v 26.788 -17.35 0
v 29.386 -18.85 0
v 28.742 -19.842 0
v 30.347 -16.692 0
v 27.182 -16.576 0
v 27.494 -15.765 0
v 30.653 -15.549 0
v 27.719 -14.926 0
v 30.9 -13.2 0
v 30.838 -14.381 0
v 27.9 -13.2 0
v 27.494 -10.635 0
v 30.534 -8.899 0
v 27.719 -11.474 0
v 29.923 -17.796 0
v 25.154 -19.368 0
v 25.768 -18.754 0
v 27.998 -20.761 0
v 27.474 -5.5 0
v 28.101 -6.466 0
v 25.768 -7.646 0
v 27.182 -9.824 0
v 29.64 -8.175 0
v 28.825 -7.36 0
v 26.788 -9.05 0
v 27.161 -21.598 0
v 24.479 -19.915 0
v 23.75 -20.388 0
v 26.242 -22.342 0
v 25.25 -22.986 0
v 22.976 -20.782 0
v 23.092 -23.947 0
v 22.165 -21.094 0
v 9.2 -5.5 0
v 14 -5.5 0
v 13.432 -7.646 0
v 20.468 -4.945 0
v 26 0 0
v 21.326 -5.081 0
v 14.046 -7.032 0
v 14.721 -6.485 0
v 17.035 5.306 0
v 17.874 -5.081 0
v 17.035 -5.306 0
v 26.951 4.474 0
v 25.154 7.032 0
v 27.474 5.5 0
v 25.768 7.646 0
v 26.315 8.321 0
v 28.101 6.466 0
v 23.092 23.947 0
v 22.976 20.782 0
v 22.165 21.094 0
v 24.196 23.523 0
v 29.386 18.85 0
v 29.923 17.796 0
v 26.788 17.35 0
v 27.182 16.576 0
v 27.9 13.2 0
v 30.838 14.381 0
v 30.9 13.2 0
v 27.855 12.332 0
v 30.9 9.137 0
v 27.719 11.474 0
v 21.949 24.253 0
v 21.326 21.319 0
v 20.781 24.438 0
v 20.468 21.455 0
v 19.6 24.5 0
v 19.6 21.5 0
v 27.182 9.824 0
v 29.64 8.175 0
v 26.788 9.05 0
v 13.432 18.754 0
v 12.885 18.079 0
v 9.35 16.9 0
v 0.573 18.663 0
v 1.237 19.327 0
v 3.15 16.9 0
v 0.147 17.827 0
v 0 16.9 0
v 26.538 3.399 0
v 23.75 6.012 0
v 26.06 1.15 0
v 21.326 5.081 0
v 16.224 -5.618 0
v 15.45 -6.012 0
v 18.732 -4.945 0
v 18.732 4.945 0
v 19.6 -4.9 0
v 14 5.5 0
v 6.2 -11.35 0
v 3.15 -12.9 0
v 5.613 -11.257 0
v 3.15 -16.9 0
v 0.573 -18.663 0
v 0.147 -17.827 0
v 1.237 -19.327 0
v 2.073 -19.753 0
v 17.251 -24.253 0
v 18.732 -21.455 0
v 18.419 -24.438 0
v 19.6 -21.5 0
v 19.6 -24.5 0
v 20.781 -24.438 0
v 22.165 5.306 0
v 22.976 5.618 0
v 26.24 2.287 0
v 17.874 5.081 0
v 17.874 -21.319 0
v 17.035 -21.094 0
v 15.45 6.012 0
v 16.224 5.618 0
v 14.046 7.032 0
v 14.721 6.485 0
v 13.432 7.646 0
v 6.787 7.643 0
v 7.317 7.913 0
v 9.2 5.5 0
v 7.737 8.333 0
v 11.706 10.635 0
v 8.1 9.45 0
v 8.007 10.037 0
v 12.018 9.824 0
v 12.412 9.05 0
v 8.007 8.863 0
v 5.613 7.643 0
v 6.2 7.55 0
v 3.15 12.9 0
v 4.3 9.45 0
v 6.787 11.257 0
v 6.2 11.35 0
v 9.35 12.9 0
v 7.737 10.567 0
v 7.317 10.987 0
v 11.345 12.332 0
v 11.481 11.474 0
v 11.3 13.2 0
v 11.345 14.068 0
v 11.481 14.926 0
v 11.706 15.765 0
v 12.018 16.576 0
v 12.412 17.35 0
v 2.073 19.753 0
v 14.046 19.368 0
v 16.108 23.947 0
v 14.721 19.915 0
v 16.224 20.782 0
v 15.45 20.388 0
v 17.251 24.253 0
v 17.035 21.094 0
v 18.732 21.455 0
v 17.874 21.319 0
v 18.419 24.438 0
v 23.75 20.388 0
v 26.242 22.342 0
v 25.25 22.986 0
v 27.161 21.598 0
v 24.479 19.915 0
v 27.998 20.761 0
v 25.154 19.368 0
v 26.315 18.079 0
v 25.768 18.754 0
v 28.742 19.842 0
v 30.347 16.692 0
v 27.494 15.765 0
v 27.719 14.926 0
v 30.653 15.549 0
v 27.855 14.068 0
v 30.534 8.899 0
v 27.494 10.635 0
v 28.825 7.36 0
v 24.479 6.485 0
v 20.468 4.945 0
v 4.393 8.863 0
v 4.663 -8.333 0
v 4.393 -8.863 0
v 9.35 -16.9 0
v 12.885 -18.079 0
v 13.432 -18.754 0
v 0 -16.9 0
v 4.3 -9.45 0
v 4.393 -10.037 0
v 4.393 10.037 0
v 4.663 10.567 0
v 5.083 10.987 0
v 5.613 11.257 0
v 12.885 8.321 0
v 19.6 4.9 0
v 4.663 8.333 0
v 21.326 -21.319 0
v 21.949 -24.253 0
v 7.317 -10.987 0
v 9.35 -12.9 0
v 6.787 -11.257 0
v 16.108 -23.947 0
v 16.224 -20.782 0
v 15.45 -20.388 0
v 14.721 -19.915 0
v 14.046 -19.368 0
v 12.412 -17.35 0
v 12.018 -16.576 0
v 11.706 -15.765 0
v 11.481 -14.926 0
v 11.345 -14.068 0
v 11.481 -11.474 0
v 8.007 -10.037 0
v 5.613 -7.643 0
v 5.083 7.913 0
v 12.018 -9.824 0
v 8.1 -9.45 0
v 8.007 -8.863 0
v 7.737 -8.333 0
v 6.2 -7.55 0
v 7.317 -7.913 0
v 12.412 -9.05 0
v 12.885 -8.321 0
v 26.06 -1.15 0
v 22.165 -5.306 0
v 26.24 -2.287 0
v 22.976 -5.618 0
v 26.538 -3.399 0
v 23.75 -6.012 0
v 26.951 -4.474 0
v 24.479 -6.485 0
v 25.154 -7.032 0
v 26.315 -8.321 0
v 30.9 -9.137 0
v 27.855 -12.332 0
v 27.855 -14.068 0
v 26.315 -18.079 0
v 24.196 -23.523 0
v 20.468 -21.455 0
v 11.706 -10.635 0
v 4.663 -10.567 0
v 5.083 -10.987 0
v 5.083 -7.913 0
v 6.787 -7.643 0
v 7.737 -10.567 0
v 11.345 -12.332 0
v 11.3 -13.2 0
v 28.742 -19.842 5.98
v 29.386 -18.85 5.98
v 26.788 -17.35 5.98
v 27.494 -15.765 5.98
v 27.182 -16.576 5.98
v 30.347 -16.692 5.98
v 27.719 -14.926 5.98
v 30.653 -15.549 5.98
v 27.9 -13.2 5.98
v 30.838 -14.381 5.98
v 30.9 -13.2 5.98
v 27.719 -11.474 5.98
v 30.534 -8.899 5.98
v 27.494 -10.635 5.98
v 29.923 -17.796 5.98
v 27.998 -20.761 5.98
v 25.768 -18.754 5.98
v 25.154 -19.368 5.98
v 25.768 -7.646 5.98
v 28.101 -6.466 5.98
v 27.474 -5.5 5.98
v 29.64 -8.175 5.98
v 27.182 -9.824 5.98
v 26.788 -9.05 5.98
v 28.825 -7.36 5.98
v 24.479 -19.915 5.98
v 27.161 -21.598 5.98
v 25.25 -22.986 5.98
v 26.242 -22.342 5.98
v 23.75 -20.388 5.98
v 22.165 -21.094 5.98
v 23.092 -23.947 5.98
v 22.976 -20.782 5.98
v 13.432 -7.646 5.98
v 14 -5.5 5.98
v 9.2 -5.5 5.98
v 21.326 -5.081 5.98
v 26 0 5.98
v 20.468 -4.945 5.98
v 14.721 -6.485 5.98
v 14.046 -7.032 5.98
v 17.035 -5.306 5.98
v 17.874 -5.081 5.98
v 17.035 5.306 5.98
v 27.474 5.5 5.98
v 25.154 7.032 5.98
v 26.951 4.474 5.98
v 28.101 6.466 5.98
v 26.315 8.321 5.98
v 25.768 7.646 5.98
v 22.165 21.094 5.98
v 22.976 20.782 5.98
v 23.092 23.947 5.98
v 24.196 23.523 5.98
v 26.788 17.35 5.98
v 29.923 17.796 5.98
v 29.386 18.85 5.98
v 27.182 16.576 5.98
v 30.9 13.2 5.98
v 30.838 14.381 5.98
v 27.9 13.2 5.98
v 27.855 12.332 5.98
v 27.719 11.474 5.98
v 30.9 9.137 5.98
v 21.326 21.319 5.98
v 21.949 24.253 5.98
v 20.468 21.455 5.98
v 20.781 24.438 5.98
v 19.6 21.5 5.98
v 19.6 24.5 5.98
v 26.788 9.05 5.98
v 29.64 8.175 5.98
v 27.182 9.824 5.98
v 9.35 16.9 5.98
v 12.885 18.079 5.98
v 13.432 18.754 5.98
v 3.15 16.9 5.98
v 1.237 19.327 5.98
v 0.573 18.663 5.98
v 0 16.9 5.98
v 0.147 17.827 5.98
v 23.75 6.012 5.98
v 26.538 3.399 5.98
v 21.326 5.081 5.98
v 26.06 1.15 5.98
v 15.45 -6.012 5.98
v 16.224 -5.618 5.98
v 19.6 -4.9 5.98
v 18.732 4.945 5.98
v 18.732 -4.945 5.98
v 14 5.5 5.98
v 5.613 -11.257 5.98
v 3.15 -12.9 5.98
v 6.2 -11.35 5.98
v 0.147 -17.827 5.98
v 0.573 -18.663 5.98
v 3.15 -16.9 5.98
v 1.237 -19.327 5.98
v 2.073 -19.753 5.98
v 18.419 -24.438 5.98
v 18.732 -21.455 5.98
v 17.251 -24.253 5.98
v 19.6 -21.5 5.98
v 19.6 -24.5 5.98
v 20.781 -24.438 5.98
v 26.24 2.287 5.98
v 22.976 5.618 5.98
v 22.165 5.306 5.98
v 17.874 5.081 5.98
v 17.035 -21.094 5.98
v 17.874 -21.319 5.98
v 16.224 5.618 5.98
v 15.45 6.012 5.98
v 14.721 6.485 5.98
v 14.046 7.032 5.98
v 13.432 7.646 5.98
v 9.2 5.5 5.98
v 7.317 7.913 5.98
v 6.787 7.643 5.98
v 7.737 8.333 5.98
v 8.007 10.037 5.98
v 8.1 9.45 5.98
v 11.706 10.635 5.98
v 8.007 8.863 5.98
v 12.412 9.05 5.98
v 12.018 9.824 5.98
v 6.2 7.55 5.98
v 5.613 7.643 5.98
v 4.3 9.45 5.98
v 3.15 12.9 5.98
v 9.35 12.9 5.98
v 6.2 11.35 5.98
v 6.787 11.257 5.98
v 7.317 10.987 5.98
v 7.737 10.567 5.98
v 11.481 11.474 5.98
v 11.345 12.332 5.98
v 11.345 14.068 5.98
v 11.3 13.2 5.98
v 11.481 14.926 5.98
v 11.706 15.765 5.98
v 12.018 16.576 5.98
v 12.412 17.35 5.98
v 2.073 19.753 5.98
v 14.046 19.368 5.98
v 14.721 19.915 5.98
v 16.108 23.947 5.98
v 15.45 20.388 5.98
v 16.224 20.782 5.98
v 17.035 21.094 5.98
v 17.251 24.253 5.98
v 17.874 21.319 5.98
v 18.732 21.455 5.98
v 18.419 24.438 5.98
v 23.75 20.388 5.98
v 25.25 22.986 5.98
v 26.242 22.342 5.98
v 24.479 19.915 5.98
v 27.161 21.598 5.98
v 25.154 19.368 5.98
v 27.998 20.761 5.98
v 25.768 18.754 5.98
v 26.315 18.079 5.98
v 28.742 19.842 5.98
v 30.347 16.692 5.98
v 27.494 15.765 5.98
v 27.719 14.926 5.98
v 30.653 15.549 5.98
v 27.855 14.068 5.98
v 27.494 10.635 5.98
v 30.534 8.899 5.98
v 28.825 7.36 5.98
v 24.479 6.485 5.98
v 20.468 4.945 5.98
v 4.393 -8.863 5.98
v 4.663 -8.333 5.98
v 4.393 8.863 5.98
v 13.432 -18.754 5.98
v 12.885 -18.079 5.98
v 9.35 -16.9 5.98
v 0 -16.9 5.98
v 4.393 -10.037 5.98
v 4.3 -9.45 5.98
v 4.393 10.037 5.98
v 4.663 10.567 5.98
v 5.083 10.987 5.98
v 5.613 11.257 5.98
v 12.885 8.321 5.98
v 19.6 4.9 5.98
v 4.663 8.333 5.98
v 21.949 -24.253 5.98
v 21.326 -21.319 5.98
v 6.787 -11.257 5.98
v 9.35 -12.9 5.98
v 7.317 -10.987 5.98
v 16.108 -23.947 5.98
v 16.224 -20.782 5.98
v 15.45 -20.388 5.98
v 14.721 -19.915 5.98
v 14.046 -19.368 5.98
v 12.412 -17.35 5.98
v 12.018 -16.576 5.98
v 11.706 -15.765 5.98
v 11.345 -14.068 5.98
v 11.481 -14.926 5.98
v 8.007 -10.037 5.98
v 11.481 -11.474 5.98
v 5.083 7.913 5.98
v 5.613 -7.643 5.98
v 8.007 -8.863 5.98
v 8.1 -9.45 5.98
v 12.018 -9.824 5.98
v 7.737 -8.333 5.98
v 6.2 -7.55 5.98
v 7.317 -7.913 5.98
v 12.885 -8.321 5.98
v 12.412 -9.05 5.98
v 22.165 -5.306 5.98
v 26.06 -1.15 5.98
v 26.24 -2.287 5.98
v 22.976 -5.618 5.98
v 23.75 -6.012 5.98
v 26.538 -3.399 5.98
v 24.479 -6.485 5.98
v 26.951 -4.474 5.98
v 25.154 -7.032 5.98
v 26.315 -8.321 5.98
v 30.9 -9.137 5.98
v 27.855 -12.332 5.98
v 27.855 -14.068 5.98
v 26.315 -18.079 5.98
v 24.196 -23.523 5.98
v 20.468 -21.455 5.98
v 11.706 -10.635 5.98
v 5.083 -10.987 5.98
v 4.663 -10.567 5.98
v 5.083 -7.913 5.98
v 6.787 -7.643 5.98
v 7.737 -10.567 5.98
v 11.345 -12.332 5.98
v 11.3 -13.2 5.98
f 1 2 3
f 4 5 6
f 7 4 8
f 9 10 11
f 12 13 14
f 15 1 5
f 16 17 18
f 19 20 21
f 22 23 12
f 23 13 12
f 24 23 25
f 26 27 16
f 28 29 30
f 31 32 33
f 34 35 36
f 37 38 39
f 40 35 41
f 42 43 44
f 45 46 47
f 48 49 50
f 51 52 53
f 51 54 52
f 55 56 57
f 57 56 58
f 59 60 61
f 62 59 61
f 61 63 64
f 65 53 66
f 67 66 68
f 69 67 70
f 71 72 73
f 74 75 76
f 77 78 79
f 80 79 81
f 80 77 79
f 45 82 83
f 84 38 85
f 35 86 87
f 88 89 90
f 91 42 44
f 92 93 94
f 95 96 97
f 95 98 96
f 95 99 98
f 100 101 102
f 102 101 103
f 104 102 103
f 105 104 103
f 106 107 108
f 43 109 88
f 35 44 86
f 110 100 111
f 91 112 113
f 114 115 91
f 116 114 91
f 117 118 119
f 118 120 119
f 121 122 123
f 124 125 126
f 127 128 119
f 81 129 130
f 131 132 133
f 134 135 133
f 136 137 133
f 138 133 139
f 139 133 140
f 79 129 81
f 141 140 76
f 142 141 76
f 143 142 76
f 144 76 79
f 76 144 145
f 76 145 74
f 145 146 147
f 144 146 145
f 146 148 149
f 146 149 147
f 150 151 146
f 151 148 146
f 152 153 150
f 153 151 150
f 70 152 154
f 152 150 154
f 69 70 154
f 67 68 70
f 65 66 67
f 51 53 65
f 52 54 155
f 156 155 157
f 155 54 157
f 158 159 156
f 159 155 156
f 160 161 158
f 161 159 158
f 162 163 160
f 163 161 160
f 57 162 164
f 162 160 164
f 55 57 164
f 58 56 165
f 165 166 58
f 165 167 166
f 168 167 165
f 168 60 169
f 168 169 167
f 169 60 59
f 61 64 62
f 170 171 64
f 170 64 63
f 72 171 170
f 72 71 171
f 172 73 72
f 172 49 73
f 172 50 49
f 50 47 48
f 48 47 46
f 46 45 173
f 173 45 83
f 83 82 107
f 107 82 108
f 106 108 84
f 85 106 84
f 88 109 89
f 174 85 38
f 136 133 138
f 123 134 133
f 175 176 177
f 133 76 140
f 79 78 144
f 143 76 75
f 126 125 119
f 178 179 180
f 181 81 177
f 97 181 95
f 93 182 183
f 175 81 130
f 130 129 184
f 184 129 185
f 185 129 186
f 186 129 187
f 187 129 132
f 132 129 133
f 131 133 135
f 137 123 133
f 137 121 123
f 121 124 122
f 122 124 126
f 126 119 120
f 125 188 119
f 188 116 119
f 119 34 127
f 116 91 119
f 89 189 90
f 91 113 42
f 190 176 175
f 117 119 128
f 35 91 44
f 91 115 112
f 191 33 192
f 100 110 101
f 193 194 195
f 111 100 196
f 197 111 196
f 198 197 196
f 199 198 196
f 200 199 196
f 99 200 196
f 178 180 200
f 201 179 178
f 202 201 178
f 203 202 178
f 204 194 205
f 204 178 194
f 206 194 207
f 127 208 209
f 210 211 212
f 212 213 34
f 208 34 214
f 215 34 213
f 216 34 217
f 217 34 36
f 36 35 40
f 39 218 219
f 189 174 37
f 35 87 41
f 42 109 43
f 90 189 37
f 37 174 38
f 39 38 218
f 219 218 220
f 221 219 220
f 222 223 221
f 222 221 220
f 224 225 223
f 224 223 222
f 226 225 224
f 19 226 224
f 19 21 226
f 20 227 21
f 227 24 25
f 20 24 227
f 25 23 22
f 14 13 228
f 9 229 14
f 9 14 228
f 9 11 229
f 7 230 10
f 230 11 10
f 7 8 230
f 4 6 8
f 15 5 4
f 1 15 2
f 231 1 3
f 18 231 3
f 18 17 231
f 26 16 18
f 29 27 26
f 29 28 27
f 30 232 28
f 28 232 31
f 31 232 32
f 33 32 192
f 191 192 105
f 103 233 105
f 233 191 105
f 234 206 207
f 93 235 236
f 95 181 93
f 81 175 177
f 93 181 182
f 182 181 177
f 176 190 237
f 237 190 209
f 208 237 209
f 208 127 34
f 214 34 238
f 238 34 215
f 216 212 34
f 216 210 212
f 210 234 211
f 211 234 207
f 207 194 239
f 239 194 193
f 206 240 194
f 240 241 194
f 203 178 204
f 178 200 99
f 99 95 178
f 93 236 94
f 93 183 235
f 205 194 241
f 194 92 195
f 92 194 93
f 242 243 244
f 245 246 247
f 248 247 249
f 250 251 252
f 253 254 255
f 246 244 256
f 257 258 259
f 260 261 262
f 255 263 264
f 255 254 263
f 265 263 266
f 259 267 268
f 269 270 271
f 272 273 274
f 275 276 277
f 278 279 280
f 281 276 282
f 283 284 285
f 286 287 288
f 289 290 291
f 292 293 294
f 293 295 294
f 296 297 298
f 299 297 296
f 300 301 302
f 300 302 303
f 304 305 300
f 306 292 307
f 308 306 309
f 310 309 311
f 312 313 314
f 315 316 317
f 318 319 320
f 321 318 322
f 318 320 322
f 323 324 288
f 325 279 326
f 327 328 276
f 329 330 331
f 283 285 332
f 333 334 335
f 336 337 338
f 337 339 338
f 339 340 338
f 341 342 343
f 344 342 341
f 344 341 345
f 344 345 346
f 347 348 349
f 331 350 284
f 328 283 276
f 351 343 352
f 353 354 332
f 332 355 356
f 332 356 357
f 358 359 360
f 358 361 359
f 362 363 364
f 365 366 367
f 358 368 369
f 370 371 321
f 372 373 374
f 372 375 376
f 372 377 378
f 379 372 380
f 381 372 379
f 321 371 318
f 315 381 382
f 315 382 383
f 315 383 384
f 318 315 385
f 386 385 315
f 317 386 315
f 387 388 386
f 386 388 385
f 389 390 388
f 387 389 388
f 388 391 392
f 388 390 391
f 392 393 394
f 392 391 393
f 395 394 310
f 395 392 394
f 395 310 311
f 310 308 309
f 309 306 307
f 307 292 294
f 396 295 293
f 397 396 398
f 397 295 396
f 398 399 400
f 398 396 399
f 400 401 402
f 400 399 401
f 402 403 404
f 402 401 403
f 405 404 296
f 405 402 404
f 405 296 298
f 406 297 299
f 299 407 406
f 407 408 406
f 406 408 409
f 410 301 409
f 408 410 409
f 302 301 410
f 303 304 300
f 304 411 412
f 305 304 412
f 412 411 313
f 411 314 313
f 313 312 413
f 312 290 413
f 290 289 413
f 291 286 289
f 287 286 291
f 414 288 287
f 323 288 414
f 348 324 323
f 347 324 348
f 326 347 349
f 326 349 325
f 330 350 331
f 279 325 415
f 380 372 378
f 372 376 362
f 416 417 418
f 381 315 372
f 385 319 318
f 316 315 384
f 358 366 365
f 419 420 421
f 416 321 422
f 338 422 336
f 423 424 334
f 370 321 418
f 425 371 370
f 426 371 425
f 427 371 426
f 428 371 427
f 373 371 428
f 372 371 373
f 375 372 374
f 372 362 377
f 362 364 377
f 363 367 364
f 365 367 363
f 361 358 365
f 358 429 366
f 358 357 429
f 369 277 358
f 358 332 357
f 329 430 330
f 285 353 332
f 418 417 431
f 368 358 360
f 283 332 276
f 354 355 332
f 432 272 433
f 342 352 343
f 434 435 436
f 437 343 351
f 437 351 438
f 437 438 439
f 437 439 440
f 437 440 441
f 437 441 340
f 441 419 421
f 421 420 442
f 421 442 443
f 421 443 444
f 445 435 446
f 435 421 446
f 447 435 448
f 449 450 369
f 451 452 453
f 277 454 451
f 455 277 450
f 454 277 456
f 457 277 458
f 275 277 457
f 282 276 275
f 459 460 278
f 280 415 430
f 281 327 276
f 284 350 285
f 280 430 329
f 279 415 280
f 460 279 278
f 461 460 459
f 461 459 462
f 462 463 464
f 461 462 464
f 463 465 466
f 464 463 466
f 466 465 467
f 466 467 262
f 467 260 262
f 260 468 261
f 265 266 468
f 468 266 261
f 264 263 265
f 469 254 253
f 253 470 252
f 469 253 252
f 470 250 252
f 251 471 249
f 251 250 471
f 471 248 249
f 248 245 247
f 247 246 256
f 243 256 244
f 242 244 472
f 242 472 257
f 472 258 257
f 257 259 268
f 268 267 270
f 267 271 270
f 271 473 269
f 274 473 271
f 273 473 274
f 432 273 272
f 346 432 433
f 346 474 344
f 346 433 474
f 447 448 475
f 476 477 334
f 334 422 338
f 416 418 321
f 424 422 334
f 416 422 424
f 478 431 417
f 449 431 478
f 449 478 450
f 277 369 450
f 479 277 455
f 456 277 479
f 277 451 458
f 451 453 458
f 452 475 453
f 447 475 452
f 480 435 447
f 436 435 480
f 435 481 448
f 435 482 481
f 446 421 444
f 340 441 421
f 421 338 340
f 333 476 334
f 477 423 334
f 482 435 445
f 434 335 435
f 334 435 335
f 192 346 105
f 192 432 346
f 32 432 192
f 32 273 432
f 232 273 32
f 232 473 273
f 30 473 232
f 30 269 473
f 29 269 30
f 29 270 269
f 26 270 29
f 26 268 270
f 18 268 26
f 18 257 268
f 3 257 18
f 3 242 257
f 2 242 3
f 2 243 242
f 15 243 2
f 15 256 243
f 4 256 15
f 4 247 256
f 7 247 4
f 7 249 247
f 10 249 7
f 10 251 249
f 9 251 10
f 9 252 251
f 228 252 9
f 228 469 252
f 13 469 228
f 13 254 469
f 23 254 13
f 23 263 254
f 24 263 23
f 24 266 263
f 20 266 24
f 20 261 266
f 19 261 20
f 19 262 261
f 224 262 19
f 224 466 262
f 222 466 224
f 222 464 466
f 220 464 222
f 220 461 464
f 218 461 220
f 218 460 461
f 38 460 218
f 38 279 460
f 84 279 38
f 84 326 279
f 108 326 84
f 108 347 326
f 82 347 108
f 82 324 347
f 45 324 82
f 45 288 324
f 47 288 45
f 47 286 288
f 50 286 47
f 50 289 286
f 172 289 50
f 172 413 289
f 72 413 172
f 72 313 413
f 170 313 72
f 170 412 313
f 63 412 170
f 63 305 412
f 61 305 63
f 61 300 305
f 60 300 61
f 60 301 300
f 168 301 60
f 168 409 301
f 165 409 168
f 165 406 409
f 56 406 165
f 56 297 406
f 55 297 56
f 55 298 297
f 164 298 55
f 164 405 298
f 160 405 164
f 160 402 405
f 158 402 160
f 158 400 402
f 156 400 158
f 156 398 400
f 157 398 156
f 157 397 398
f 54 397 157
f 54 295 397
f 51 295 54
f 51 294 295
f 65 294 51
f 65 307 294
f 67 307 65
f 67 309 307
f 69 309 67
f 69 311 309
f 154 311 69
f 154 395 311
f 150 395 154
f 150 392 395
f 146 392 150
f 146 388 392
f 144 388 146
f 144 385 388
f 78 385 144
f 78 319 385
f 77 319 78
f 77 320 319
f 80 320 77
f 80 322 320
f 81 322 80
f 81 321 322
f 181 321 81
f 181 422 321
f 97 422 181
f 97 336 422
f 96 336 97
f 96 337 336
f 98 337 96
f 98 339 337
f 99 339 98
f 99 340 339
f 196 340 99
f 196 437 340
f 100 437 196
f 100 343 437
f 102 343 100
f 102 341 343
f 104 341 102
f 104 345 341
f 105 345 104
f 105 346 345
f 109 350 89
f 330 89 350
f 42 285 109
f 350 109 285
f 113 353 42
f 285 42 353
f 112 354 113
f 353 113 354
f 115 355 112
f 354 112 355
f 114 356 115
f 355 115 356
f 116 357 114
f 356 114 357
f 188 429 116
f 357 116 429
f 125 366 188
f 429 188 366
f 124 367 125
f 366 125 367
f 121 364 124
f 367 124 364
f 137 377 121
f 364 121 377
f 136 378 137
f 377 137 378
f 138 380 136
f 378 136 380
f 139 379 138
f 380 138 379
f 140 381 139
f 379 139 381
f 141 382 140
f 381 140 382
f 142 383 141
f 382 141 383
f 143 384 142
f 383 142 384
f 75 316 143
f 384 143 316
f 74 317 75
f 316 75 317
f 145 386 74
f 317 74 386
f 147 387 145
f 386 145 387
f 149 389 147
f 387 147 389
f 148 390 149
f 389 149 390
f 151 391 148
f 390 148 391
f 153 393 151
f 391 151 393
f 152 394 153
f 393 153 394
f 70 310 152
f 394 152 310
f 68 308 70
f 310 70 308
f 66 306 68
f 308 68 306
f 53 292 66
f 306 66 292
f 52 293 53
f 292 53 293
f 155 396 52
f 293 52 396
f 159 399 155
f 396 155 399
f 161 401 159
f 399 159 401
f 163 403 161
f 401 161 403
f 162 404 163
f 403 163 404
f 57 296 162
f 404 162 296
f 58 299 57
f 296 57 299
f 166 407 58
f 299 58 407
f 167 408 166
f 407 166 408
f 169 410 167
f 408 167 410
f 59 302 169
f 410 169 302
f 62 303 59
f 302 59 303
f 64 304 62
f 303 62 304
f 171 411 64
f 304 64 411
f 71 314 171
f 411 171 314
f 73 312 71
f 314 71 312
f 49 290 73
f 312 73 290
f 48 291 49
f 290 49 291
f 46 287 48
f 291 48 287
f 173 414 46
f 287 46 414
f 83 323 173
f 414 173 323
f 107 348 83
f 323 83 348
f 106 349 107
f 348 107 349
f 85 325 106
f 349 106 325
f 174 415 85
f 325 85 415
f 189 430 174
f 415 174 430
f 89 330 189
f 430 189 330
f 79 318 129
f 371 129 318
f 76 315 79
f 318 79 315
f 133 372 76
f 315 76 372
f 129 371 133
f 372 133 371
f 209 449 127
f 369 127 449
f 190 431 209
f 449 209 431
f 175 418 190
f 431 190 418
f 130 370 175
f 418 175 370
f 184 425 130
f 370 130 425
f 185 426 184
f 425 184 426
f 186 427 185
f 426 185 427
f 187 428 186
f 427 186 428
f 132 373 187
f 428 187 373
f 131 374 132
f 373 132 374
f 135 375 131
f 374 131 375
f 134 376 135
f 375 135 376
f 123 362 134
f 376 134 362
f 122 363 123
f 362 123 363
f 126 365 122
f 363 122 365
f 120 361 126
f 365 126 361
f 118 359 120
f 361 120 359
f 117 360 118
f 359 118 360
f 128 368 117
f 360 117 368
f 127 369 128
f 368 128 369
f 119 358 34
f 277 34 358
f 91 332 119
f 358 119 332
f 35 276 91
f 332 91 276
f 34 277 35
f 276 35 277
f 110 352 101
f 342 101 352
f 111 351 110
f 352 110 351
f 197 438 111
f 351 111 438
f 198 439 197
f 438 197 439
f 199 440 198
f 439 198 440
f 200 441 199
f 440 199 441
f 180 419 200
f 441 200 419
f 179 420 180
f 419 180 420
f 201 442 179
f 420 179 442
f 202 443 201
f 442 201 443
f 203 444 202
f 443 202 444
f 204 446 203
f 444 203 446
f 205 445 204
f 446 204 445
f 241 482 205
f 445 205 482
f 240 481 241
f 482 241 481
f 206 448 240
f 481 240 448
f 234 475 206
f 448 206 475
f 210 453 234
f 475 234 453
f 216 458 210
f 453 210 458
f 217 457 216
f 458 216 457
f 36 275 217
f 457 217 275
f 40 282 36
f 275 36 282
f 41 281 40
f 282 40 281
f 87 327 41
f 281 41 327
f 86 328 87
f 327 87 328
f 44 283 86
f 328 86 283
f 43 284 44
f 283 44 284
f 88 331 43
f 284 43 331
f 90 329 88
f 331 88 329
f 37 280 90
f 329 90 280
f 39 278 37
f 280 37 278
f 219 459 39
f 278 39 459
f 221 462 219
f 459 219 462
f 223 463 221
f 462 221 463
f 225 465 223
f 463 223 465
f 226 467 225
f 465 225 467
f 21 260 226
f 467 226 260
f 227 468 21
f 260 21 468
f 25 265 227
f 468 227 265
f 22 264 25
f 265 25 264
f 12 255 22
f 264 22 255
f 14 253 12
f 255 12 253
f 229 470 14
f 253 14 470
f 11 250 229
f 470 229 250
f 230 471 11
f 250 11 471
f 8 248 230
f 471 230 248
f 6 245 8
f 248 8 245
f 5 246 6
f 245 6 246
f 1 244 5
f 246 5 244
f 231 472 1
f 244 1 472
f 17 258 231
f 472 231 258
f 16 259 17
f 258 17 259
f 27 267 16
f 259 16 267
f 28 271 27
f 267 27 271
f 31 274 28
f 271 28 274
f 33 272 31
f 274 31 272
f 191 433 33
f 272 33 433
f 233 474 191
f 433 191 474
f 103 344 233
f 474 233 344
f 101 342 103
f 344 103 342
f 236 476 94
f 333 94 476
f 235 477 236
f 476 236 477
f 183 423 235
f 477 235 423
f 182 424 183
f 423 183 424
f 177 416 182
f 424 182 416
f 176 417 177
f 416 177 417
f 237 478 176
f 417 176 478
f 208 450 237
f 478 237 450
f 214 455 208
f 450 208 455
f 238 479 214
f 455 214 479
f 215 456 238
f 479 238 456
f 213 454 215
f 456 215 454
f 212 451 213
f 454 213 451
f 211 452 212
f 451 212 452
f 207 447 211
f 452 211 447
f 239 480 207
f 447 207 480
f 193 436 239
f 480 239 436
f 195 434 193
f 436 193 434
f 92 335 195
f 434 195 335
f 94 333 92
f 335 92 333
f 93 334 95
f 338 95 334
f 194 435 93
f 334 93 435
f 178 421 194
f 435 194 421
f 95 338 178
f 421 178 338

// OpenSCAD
// sensorFront: "Face" to hold sonar sensor "eyes"

// Definitions (all lengths are in millimeters)
bh = 1.9; // radius of 4-40 bolt hole
sh = 8.3;  // radius of sonar "eyes"
ehght = 19.6; // center of the "eye" on the x-axis
yc=0; // y-axis center of model (axis of symmetry)

// this module defines a 2D shape that we'll then
// extrude to the desired thickness
module sensorFront() {

  difference() { //hull vs. everything else

    hull() {
    //"envelope" over these four shapes define the
    // outer boundary of the shape
      translate([ehght,yc+13.2]) circle(r=sh+3, $fn=60);
      translate([ehght,yc-13.2]) circle(r=sh+3, $fn=60);
      translate([3,yc+16.9]) circle(r=3, $fn=20);
      translate([3,yc-16.9]) circle(r=3, $fn=20);
    } 

    // everything below here is a "cutout" from the shape
    
    //holes for sonar eyes
    translate([ehght,yc+13.2]) circle(r=sh, $fn=60);
    translate([ehght,yc-13.2]) circle(r=sh, $fn=60);

    //two openings to accept tabs in sensorBase
    translate([3.15,yc+12.9]) square([6.2,4]);
    translate([3.15,yc-12.9-4]) square([6.2,4]);

    //holes for the bolts
    translate([6.2,yc+9.45]) circle(bh, $fn=20);
    translate([6.2,yc-9.45]) circle(bh, $fn=20);

    //clearance for popout (crystal) from sonar circuit
    translate([9.2,yc-11/2]) square([4.8,11]);

    //clearance for header pins from sonar circuit
    translate([37,yc]) circle(11, $fn=60);

  } //end of the difference() function
} //end of the module

//this line converts from a 2D to a 3D shape
linear_extrude(height=5.98) sensorFront();
